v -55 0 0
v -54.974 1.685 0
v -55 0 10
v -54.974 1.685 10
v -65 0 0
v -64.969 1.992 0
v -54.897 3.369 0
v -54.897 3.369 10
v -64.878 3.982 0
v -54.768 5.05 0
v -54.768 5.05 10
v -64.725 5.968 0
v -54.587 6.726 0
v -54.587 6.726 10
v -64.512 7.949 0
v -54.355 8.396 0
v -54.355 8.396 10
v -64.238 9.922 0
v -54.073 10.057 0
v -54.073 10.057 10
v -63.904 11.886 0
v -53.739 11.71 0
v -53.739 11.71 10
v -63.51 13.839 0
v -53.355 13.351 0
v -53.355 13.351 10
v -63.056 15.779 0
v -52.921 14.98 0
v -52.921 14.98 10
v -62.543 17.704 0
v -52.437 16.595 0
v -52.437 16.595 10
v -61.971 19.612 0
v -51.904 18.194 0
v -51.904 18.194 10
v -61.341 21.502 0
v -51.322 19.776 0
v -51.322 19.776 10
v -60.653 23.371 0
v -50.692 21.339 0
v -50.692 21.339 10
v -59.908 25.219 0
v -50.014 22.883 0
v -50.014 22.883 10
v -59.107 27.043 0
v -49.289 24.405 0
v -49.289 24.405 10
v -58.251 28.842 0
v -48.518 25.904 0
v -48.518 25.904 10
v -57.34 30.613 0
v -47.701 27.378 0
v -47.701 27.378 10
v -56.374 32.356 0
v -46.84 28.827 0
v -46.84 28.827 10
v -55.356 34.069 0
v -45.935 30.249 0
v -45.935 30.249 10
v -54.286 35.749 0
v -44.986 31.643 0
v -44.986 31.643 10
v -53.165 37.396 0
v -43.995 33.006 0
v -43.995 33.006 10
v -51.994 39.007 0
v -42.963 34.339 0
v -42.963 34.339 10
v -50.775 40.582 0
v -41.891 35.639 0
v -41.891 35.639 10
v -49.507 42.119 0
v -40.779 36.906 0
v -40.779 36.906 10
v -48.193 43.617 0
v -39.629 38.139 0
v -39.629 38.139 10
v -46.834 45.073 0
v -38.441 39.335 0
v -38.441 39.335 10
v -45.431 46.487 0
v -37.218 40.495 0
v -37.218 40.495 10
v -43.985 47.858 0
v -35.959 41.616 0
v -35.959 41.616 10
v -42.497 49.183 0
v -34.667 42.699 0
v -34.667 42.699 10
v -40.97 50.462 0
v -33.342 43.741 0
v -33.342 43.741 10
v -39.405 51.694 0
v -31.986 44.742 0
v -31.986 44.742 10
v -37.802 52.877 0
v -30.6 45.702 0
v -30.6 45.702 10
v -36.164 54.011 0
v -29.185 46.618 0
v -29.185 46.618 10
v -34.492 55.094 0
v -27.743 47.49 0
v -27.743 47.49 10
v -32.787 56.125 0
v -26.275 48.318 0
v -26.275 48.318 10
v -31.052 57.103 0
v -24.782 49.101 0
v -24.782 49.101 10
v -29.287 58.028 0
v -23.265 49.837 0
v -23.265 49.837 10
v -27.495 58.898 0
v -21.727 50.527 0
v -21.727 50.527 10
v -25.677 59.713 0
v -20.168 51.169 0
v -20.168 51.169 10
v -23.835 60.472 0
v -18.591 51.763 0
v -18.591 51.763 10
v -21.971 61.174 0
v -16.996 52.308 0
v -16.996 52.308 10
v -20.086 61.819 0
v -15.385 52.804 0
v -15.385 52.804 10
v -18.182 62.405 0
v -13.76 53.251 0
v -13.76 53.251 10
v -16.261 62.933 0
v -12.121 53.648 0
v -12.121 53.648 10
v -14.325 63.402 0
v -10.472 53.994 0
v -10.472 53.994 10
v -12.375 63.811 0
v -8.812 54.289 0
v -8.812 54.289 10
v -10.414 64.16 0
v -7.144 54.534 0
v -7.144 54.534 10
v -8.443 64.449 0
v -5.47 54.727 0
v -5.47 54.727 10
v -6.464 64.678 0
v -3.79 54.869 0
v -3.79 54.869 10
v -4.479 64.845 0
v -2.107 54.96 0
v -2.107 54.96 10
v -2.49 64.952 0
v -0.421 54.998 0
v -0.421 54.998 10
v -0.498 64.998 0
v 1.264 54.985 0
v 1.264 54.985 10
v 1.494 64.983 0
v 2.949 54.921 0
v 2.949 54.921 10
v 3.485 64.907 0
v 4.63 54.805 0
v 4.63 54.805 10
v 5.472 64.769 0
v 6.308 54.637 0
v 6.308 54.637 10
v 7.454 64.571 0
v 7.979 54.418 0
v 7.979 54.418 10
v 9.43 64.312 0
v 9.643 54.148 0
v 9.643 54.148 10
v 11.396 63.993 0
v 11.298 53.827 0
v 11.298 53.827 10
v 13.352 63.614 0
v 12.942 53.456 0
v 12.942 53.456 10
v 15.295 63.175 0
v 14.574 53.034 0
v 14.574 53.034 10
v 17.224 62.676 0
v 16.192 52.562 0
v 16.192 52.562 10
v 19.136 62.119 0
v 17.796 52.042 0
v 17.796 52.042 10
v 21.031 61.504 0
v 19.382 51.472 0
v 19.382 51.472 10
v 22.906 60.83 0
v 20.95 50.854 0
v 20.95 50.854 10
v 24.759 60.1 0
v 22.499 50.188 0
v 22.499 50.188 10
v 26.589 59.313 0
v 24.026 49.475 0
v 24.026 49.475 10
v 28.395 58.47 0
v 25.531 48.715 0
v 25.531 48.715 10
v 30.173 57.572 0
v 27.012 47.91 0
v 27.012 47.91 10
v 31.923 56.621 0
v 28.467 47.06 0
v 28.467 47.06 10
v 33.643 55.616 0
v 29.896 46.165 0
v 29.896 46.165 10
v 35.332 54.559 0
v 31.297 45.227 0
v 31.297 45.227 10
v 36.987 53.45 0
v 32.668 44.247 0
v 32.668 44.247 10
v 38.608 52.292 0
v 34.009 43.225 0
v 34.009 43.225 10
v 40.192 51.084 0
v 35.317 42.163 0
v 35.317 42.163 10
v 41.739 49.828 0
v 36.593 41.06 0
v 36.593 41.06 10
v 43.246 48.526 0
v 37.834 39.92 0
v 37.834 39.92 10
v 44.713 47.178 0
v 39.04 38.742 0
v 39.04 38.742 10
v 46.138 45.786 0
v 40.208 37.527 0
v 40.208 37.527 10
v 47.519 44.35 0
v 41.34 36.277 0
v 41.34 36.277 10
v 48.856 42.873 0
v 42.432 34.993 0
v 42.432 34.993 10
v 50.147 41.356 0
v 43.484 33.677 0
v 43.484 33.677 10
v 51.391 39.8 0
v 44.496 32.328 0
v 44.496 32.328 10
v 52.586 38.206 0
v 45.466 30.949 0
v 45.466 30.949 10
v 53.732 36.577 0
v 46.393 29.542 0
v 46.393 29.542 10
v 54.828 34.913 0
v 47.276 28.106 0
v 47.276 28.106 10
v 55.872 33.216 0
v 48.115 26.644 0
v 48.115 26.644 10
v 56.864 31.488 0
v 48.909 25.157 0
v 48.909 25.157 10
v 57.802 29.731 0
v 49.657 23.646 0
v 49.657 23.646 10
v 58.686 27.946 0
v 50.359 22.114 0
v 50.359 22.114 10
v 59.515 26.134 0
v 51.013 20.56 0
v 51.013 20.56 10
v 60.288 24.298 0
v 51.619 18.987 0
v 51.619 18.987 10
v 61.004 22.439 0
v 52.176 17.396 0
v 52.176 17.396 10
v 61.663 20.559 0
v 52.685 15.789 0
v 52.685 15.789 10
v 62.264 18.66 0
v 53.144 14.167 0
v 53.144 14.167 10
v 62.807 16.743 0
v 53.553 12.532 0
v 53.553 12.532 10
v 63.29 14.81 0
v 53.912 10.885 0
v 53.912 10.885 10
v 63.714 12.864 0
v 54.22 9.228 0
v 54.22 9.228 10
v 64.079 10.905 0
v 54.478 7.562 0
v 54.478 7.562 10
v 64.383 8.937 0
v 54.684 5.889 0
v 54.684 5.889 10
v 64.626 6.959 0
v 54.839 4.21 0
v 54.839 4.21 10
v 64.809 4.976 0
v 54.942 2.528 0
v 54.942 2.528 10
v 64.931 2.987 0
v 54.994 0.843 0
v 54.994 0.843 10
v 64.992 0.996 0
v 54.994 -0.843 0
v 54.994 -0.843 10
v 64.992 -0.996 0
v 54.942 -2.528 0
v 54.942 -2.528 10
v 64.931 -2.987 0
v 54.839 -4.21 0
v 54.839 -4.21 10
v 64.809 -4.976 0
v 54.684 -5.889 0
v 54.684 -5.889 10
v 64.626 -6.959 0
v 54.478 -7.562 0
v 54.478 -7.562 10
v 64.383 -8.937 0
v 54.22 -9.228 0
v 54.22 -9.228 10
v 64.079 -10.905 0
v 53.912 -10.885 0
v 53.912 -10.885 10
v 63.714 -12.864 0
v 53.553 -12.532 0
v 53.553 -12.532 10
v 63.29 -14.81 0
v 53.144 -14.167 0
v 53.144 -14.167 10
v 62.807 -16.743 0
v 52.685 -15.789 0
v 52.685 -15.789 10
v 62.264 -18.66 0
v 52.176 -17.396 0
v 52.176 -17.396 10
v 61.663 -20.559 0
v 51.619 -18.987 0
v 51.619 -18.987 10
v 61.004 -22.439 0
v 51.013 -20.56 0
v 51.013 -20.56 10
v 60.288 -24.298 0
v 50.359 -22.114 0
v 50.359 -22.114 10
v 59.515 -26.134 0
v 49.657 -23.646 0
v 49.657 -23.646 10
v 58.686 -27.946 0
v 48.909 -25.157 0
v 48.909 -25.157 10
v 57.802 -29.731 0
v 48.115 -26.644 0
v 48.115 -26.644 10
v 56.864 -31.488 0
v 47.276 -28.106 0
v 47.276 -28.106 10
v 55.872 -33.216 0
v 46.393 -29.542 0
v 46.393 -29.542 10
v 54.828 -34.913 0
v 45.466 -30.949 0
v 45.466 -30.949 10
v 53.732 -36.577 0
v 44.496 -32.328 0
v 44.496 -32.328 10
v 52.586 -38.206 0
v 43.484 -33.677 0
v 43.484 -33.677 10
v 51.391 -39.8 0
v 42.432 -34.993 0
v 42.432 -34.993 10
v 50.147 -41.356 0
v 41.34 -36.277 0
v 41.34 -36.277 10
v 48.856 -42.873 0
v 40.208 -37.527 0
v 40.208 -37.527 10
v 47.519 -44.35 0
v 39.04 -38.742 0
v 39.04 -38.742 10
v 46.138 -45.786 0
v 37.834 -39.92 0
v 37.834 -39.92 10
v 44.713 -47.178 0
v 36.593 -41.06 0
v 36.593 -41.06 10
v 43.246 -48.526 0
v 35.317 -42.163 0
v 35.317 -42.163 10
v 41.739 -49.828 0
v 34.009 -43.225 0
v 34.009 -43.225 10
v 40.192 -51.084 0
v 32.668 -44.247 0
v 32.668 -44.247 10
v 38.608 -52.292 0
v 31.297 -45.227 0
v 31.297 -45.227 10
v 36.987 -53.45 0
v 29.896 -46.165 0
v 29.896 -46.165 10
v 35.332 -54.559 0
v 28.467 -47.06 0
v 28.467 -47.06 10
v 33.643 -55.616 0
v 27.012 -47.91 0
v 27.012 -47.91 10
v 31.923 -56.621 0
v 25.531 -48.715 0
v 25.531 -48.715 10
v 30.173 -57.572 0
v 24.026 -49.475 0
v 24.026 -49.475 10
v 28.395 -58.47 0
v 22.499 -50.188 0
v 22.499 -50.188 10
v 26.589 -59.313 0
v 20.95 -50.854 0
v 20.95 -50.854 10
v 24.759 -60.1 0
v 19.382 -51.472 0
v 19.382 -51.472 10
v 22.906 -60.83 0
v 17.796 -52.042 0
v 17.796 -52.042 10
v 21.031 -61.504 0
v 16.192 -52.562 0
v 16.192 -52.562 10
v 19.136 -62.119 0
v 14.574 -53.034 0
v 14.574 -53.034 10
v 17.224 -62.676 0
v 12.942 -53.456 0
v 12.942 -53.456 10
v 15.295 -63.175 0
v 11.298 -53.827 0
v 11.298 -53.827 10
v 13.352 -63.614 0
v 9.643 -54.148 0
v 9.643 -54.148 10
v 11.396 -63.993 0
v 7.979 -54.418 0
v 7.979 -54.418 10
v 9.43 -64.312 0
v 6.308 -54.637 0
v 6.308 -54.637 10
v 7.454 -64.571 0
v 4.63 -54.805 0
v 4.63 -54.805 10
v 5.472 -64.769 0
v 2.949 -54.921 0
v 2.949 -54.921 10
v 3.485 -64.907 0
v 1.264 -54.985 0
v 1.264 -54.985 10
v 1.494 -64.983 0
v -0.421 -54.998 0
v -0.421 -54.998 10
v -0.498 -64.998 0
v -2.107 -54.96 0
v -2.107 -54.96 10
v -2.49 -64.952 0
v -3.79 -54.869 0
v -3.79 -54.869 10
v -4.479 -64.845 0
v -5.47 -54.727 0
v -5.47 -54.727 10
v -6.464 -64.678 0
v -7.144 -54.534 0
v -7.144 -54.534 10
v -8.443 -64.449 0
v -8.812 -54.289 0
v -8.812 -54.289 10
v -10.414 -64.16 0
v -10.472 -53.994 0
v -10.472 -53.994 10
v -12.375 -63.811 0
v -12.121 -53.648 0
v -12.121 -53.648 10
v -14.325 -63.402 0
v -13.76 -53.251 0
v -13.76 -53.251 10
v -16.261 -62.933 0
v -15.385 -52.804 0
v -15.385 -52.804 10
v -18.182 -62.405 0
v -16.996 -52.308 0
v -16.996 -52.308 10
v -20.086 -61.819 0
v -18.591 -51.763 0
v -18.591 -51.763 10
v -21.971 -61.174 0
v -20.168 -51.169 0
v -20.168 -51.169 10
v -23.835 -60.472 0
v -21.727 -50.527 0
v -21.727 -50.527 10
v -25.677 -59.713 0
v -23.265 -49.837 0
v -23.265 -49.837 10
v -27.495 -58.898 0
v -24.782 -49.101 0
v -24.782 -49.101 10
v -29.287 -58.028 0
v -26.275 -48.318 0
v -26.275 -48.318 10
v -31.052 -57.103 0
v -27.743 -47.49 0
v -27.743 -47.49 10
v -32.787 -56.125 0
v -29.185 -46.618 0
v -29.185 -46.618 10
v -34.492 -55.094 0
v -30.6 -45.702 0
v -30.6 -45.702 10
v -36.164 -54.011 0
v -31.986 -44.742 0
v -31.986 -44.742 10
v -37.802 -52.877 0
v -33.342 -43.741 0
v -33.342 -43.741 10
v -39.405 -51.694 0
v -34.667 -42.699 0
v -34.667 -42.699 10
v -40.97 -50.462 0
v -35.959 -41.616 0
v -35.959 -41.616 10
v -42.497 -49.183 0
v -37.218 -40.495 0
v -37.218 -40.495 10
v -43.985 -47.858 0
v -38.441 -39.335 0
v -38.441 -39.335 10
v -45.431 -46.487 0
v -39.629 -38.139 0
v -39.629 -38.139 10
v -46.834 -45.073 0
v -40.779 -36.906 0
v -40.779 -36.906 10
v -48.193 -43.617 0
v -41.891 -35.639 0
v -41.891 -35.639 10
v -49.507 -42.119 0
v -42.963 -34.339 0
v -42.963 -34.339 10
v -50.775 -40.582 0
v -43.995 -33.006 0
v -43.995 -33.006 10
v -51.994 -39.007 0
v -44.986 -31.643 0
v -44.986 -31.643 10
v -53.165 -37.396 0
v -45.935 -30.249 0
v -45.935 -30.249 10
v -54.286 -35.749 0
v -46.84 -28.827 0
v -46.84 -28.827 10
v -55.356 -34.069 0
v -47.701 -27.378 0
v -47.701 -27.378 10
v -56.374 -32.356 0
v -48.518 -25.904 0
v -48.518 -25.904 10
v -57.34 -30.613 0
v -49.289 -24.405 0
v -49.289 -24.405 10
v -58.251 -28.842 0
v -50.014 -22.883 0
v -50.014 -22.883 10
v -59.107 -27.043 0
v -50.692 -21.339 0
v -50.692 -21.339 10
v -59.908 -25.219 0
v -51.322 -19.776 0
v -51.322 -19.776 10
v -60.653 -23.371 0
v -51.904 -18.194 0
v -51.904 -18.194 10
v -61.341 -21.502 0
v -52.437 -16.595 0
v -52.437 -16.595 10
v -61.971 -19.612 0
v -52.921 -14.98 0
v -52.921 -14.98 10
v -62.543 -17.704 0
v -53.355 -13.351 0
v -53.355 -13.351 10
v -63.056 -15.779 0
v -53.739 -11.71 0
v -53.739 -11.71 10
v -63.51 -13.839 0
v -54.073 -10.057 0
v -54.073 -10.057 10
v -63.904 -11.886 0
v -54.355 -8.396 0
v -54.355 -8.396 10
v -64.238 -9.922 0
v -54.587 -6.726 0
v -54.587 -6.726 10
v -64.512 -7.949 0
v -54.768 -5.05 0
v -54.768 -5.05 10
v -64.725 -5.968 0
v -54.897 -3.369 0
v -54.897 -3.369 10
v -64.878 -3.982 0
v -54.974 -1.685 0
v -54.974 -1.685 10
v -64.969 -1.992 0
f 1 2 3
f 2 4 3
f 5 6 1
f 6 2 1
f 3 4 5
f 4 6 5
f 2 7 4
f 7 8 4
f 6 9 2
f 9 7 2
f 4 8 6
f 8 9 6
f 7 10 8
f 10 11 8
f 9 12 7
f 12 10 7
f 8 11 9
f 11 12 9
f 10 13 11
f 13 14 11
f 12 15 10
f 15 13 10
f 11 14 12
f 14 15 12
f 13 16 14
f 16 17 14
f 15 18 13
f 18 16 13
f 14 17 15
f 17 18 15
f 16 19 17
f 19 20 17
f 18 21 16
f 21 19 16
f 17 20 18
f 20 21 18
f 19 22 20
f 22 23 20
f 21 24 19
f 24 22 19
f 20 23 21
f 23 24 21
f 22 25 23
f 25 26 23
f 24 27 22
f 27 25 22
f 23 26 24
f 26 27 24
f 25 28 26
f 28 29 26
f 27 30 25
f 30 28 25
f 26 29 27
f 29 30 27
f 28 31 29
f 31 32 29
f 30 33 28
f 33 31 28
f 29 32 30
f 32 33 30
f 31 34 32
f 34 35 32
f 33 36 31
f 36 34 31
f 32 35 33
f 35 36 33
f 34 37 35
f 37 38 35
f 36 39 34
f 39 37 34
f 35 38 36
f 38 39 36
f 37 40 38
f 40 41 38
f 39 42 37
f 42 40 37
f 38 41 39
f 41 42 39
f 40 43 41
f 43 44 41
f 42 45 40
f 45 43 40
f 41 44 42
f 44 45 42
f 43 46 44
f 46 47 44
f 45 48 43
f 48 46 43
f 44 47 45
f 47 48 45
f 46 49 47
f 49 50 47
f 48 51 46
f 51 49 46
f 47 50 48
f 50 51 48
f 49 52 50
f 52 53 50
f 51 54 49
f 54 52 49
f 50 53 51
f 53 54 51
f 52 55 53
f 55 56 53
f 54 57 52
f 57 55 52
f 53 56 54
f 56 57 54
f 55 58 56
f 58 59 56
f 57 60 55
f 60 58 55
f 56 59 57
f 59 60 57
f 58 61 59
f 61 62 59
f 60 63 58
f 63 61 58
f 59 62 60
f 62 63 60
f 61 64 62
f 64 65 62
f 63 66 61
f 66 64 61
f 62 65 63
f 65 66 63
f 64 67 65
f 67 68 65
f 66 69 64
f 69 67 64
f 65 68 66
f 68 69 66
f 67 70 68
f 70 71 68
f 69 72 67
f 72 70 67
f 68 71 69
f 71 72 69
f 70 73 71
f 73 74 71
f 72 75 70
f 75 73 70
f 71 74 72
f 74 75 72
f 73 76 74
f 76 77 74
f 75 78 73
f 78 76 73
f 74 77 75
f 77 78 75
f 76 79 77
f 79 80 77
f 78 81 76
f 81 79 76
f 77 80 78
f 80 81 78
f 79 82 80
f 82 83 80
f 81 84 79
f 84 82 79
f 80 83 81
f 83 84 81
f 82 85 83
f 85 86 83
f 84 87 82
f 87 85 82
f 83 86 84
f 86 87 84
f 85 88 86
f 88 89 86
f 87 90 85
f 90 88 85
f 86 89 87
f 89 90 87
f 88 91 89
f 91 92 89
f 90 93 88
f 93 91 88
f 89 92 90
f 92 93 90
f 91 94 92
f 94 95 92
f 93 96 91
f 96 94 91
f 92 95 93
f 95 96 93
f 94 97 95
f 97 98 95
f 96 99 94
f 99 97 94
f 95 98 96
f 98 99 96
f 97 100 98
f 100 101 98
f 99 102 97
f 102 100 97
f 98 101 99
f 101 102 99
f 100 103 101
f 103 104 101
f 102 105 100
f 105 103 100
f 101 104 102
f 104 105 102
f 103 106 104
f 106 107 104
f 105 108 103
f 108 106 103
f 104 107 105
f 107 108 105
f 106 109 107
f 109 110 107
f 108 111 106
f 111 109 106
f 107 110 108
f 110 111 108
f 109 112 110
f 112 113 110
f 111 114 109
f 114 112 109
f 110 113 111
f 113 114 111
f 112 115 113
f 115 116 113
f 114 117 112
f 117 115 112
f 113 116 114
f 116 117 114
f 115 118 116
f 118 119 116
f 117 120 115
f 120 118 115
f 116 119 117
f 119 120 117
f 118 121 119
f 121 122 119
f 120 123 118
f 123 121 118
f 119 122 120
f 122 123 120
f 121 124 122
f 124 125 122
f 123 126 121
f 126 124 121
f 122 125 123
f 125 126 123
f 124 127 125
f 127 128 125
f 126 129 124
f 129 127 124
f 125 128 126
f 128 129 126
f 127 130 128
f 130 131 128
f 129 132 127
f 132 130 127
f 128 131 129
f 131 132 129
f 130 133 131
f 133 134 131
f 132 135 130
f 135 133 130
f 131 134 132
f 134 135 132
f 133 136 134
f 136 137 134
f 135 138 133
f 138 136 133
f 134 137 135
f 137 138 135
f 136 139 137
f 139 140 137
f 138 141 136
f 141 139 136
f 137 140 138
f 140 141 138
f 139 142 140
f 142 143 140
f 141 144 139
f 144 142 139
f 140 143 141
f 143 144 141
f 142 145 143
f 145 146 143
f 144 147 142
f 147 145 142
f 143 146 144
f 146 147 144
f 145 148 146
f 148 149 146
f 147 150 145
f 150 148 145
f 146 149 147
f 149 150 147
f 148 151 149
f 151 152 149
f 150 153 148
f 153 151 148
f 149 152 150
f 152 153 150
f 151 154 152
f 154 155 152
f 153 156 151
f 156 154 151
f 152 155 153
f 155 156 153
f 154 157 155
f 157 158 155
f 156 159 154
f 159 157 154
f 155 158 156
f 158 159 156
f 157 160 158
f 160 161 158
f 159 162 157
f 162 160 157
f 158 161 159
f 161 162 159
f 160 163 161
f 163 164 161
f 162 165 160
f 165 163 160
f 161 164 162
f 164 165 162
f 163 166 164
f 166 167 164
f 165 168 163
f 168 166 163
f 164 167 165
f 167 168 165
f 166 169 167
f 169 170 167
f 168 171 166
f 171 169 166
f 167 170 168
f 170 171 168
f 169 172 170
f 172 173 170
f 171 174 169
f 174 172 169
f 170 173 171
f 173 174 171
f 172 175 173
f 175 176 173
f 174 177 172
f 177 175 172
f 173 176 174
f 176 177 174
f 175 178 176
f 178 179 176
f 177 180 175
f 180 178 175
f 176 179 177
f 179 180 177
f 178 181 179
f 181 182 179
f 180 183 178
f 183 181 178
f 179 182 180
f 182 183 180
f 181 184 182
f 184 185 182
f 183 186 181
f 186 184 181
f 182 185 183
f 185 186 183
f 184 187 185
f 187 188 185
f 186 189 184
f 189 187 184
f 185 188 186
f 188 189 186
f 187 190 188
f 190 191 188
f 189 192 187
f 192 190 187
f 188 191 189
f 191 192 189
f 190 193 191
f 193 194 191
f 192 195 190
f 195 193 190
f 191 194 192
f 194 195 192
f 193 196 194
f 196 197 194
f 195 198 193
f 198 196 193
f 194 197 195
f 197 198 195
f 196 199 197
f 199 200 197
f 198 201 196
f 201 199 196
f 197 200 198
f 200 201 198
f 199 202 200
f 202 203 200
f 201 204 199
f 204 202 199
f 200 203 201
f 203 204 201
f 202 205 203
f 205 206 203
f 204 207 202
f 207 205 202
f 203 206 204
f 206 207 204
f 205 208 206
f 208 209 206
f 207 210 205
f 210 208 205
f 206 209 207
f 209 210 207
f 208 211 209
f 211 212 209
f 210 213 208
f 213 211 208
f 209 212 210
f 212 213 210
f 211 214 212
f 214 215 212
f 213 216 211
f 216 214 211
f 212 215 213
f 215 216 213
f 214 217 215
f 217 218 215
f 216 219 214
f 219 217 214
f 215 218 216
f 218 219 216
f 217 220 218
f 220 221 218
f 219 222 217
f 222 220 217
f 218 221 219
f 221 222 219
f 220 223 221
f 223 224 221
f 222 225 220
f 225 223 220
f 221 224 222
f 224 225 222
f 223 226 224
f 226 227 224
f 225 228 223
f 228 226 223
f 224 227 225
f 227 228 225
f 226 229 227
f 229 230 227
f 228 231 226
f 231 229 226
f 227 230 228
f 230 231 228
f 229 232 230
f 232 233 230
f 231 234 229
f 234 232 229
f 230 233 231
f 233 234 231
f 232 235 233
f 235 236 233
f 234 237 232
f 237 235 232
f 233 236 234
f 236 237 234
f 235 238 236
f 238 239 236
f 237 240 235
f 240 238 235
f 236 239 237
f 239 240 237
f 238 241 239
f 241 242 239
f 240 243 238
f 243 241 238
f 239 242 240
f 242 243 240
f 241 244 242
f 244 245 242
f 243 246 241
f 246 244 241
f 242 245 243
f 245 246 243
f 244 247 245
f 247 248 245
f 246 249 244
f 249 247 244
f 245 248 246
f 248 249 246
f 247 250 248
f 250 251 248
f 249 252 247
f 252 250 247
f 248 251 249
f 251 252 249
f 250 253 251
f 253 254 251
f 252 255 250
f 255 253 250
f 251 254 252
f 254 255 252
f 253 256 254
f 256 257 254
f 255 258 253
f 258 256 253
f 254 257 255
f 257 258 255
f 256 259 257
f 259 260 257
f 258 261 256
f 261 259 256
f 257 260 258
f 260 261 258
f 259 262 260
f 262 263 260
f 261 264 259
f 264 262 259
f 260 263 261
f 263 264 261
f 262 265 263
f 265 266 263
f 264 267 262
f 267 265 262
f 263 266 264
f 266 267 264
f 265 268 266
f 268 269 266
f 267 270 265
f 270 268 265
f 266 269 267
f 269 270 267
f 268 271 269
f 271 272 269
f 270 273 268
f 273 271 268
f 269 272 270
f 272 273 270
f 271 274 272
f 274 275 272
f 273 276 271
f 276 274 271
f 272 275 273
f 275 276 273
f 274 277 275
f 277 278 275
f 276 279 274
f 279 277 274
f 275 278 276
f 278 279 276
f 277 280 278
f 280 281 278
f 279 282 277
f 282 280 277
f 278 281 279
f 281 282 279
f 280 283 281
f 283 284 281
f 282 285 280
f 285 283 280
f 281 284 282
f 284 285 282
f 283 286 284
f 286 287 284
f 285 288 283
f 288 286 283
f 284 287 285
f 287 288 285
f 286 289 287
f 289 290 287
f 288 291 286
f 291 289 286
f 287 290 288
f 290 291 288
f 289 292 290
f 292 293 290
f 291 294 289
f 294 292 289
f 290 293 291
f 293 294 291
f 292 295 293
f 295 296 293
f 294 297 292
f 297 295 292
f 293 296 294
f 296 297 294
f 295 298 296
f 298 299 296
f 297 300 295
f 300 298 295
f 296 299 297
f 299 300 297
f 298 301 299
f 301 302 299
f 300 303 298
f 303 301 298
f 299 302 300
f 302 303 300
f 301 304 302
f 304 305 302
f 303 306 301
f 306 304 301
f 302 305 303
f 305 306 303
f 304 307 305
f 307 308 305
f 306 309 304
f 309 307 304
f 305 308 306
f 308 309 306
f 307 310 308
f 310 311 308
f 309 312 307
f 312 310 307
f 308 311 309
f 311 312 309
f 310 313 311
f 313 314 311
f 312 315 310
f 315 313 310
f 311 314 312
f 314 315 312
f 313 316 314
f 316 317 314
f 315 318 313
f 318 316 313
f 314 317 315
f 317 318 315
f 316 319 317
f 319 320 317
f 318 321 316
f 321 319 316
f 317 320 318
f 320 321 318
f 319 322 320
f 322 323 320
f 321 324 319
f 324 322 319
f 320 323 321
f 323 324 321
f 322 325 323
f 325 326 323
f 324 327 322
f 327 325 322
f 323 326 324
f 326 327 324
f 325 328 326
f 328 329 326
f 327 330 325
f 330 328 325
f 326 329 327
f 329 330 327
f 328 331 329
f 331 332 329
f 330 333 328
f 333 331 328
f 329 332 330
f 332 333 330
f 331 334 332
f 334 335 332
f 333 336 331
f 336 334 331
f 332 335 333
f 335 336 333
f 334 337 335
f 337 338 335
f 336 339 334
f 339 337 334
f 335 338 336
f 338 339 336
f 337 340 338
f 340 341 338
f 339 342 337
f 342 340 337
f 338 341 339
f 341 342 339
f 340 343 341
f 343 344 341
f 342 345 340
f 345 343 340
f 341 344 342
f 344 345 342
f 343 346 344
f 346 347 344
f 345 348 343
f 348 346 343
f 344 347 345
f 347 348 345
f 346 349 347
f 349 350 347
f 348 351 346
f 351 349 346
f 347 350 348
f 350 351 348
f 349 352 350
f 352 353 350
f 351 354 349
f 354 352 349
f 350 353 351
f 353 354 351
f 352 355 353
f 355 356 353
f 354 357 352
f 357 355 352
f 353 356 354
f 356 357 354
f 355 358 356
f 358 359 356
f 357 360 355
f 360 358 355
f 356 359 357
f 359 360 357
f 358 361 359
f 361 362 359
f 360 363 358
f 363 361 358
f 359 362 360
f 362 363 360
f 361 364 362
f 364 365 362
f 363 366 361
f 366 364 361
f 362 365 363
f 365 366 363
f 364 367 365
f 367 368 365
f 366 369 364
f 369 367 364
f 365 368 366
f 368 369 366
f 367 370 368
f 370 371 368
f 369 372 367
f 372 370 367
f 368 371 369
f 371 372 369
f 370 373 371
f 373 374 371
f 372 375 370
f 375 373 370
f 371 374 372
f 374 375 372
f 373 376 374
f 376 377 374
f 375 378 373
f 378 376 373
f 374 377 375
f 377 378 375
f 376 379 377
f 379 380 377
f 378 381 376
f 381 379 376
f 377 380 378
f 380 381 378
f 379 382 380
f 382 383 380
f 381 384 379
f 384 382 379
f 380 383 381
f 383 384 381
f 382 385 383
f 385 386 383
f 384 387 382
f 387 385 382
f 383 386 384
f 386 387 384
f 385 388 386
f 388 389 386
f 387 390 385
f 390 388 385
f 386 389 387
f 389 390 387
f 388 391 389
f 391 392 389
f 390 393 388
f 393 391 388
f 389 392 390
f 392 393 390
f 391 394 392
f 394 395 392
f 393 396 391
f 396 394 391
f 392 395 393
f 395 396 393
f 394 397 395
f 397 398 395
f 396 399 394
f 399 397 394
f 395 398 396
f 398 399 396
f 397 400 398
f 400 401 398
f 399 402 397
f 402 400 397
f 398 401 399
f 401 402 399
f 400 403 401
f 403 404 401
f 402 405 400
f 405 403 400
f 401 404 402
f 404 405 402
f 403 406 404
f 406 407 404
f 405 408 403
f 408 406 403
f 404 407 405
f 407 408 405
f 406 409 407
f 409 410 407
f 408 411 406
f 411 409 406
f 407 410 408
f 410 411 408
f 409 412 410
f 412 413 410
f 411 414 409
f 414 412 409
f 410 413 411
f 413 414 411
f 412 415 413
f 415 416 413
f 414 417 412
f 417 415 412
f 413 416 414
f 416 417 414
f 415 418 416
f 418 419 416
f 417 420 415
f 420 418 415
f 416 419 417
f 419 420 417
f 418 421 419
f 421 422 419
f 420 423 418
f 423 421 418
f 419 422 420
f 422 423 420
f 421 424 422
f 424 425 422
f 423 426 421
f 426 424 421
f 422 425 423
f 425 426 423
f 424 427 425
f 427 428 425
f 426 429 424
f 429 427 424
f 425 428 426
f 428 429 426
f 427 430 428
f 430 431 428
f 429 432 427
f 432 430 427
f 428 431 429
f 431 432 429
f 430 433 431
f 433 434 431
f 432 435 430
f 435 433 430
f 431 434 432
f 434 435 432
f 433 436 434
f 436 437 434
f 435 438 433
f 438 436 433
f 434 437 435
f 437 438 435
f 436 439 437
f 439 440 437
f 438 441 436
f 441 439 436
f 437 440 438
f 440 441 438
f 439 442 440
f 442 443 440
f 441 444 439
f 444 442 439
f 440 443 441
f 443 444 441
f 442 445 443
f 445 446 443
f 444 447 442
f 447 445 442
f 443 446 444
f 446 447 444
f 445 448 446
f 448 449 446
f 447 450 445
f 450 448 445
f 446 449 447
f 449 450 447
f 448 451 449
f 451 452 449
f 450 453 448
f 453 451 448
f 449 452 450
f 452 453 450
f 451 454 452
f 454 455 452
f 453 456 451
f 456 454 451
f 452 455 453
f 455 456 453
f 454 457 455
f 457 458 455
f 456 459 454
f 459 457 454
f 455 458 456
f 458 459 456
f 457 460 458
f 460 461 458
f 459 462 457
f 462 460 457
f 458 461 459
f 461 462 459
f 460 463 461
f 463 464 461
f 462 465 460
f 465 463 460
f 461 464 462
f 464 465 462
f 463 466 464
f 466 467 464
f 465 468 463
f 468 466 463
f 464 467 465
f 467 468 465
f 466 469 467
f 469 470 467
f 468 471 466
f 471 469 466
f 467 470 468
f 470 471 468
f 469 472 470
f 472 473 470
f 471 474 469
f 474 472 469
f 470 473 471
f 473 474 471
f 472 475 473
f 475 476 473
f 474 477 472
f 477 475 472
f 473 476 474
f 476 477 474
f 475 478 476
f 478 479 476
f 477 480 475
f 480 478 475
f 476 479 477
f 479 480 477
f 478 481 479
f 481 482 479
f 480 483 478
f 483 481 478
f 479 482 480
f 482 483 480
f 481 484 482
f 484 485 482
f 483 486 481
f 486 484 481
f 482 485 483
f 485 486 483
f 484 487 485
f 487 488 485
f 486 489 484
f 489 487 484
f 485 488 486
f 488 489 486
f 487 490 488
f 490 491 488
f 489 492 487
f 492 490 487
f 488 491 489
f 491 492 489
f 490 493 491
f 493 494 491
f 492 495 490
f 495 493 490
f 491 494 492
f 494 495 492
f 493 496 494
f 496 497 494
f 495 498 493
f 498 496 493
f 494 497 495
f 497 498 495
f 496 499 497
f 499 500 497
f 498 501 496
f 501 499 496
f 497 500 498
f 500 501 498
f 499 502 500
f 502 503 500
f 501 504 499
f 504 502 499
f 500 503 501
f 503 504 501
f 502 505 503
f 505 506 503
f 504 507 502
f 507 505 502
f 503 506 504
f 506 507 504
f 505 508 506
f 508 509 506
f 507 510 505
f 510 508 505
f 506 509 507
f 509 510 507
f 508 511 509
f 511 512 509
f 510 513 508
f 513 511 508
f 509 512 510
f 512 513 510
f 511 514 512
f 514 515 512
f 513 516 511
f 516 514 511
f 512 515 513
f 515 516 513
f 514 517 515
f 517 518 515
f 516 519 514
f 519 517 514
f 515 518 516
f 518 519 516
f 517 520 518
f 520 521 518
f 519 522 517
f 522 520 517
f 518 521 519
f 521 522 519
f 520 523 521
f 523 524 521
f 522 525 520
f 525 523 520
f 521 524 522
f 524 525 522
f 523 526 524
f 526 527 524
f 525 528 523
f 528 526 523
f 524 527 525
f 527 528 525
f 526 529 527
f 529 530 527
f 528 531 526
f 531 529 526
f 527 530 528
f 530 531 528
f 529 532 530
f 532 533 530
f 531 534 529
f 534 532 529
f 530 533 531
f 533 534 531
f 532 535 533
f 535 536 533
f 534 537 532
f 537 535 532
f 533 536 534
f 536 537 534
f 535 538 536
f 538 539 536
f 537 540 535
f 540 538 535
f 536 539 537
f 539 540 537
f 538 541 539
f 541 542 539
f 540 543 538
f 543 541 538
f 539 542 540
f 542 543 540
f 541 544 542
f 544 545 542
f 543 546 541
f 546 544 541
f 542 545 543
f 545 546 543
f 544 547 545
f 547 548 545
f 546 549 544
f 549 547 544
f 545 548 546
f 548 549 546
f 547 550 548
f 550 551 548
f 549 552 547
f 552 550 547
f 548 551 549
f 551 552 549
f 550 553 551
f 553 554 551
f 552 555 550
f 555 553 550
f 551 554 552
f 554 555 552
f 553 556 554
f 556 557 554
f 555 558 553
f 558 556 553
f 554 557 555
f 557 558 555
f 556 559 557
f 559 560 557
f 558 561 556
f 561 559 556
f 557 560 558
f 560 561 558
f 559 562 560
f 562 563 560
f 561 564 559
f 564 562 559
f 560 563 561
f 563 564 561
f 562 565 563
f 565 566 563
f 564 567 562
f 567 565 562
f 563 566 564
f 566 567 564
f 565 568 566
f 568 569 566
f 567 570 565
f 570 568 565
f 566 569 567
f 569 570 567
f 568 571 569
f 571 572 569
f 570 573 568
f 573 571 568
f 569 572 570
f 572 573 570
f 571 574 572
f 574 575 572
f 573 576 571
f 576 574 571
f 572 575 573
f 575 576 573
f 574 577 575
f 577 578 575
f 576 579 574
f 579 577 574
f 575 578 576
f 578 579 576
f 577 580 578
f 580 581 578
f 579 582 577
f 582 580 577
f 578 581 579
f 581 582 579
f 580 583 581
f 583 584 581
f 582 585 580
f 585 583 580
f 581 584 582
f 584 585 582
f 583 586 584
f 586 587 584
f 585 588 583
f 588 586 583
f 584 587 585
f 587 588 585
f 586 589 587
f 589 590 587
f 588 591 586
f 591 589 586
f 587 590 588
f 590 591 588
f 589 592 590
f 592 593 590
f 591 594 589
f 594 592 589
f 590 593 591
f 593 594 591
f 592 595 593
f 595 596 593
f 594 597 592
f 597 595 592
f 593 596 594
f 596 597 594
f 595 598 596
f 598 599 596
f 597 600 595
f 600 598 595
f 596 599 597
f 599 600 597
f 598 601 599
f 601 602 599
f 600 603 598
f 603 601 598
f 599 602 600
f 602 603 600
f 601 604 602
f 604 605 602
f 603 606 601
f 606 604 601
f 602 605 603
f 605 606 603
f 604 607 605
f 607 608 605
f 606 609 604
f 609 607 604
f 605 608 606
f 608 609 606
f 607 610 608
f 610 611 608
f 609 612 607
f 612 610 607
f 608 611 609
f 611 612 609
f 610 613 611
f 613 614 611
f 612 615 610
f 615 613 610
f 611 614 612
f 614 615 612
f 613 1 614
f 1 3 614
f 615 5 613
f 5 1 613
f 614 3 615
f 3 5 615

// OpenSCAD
rotate_extrude(convexity = 10, $fa=1)

polygon(points=[[55,0],[65,0],[55,10]]);
